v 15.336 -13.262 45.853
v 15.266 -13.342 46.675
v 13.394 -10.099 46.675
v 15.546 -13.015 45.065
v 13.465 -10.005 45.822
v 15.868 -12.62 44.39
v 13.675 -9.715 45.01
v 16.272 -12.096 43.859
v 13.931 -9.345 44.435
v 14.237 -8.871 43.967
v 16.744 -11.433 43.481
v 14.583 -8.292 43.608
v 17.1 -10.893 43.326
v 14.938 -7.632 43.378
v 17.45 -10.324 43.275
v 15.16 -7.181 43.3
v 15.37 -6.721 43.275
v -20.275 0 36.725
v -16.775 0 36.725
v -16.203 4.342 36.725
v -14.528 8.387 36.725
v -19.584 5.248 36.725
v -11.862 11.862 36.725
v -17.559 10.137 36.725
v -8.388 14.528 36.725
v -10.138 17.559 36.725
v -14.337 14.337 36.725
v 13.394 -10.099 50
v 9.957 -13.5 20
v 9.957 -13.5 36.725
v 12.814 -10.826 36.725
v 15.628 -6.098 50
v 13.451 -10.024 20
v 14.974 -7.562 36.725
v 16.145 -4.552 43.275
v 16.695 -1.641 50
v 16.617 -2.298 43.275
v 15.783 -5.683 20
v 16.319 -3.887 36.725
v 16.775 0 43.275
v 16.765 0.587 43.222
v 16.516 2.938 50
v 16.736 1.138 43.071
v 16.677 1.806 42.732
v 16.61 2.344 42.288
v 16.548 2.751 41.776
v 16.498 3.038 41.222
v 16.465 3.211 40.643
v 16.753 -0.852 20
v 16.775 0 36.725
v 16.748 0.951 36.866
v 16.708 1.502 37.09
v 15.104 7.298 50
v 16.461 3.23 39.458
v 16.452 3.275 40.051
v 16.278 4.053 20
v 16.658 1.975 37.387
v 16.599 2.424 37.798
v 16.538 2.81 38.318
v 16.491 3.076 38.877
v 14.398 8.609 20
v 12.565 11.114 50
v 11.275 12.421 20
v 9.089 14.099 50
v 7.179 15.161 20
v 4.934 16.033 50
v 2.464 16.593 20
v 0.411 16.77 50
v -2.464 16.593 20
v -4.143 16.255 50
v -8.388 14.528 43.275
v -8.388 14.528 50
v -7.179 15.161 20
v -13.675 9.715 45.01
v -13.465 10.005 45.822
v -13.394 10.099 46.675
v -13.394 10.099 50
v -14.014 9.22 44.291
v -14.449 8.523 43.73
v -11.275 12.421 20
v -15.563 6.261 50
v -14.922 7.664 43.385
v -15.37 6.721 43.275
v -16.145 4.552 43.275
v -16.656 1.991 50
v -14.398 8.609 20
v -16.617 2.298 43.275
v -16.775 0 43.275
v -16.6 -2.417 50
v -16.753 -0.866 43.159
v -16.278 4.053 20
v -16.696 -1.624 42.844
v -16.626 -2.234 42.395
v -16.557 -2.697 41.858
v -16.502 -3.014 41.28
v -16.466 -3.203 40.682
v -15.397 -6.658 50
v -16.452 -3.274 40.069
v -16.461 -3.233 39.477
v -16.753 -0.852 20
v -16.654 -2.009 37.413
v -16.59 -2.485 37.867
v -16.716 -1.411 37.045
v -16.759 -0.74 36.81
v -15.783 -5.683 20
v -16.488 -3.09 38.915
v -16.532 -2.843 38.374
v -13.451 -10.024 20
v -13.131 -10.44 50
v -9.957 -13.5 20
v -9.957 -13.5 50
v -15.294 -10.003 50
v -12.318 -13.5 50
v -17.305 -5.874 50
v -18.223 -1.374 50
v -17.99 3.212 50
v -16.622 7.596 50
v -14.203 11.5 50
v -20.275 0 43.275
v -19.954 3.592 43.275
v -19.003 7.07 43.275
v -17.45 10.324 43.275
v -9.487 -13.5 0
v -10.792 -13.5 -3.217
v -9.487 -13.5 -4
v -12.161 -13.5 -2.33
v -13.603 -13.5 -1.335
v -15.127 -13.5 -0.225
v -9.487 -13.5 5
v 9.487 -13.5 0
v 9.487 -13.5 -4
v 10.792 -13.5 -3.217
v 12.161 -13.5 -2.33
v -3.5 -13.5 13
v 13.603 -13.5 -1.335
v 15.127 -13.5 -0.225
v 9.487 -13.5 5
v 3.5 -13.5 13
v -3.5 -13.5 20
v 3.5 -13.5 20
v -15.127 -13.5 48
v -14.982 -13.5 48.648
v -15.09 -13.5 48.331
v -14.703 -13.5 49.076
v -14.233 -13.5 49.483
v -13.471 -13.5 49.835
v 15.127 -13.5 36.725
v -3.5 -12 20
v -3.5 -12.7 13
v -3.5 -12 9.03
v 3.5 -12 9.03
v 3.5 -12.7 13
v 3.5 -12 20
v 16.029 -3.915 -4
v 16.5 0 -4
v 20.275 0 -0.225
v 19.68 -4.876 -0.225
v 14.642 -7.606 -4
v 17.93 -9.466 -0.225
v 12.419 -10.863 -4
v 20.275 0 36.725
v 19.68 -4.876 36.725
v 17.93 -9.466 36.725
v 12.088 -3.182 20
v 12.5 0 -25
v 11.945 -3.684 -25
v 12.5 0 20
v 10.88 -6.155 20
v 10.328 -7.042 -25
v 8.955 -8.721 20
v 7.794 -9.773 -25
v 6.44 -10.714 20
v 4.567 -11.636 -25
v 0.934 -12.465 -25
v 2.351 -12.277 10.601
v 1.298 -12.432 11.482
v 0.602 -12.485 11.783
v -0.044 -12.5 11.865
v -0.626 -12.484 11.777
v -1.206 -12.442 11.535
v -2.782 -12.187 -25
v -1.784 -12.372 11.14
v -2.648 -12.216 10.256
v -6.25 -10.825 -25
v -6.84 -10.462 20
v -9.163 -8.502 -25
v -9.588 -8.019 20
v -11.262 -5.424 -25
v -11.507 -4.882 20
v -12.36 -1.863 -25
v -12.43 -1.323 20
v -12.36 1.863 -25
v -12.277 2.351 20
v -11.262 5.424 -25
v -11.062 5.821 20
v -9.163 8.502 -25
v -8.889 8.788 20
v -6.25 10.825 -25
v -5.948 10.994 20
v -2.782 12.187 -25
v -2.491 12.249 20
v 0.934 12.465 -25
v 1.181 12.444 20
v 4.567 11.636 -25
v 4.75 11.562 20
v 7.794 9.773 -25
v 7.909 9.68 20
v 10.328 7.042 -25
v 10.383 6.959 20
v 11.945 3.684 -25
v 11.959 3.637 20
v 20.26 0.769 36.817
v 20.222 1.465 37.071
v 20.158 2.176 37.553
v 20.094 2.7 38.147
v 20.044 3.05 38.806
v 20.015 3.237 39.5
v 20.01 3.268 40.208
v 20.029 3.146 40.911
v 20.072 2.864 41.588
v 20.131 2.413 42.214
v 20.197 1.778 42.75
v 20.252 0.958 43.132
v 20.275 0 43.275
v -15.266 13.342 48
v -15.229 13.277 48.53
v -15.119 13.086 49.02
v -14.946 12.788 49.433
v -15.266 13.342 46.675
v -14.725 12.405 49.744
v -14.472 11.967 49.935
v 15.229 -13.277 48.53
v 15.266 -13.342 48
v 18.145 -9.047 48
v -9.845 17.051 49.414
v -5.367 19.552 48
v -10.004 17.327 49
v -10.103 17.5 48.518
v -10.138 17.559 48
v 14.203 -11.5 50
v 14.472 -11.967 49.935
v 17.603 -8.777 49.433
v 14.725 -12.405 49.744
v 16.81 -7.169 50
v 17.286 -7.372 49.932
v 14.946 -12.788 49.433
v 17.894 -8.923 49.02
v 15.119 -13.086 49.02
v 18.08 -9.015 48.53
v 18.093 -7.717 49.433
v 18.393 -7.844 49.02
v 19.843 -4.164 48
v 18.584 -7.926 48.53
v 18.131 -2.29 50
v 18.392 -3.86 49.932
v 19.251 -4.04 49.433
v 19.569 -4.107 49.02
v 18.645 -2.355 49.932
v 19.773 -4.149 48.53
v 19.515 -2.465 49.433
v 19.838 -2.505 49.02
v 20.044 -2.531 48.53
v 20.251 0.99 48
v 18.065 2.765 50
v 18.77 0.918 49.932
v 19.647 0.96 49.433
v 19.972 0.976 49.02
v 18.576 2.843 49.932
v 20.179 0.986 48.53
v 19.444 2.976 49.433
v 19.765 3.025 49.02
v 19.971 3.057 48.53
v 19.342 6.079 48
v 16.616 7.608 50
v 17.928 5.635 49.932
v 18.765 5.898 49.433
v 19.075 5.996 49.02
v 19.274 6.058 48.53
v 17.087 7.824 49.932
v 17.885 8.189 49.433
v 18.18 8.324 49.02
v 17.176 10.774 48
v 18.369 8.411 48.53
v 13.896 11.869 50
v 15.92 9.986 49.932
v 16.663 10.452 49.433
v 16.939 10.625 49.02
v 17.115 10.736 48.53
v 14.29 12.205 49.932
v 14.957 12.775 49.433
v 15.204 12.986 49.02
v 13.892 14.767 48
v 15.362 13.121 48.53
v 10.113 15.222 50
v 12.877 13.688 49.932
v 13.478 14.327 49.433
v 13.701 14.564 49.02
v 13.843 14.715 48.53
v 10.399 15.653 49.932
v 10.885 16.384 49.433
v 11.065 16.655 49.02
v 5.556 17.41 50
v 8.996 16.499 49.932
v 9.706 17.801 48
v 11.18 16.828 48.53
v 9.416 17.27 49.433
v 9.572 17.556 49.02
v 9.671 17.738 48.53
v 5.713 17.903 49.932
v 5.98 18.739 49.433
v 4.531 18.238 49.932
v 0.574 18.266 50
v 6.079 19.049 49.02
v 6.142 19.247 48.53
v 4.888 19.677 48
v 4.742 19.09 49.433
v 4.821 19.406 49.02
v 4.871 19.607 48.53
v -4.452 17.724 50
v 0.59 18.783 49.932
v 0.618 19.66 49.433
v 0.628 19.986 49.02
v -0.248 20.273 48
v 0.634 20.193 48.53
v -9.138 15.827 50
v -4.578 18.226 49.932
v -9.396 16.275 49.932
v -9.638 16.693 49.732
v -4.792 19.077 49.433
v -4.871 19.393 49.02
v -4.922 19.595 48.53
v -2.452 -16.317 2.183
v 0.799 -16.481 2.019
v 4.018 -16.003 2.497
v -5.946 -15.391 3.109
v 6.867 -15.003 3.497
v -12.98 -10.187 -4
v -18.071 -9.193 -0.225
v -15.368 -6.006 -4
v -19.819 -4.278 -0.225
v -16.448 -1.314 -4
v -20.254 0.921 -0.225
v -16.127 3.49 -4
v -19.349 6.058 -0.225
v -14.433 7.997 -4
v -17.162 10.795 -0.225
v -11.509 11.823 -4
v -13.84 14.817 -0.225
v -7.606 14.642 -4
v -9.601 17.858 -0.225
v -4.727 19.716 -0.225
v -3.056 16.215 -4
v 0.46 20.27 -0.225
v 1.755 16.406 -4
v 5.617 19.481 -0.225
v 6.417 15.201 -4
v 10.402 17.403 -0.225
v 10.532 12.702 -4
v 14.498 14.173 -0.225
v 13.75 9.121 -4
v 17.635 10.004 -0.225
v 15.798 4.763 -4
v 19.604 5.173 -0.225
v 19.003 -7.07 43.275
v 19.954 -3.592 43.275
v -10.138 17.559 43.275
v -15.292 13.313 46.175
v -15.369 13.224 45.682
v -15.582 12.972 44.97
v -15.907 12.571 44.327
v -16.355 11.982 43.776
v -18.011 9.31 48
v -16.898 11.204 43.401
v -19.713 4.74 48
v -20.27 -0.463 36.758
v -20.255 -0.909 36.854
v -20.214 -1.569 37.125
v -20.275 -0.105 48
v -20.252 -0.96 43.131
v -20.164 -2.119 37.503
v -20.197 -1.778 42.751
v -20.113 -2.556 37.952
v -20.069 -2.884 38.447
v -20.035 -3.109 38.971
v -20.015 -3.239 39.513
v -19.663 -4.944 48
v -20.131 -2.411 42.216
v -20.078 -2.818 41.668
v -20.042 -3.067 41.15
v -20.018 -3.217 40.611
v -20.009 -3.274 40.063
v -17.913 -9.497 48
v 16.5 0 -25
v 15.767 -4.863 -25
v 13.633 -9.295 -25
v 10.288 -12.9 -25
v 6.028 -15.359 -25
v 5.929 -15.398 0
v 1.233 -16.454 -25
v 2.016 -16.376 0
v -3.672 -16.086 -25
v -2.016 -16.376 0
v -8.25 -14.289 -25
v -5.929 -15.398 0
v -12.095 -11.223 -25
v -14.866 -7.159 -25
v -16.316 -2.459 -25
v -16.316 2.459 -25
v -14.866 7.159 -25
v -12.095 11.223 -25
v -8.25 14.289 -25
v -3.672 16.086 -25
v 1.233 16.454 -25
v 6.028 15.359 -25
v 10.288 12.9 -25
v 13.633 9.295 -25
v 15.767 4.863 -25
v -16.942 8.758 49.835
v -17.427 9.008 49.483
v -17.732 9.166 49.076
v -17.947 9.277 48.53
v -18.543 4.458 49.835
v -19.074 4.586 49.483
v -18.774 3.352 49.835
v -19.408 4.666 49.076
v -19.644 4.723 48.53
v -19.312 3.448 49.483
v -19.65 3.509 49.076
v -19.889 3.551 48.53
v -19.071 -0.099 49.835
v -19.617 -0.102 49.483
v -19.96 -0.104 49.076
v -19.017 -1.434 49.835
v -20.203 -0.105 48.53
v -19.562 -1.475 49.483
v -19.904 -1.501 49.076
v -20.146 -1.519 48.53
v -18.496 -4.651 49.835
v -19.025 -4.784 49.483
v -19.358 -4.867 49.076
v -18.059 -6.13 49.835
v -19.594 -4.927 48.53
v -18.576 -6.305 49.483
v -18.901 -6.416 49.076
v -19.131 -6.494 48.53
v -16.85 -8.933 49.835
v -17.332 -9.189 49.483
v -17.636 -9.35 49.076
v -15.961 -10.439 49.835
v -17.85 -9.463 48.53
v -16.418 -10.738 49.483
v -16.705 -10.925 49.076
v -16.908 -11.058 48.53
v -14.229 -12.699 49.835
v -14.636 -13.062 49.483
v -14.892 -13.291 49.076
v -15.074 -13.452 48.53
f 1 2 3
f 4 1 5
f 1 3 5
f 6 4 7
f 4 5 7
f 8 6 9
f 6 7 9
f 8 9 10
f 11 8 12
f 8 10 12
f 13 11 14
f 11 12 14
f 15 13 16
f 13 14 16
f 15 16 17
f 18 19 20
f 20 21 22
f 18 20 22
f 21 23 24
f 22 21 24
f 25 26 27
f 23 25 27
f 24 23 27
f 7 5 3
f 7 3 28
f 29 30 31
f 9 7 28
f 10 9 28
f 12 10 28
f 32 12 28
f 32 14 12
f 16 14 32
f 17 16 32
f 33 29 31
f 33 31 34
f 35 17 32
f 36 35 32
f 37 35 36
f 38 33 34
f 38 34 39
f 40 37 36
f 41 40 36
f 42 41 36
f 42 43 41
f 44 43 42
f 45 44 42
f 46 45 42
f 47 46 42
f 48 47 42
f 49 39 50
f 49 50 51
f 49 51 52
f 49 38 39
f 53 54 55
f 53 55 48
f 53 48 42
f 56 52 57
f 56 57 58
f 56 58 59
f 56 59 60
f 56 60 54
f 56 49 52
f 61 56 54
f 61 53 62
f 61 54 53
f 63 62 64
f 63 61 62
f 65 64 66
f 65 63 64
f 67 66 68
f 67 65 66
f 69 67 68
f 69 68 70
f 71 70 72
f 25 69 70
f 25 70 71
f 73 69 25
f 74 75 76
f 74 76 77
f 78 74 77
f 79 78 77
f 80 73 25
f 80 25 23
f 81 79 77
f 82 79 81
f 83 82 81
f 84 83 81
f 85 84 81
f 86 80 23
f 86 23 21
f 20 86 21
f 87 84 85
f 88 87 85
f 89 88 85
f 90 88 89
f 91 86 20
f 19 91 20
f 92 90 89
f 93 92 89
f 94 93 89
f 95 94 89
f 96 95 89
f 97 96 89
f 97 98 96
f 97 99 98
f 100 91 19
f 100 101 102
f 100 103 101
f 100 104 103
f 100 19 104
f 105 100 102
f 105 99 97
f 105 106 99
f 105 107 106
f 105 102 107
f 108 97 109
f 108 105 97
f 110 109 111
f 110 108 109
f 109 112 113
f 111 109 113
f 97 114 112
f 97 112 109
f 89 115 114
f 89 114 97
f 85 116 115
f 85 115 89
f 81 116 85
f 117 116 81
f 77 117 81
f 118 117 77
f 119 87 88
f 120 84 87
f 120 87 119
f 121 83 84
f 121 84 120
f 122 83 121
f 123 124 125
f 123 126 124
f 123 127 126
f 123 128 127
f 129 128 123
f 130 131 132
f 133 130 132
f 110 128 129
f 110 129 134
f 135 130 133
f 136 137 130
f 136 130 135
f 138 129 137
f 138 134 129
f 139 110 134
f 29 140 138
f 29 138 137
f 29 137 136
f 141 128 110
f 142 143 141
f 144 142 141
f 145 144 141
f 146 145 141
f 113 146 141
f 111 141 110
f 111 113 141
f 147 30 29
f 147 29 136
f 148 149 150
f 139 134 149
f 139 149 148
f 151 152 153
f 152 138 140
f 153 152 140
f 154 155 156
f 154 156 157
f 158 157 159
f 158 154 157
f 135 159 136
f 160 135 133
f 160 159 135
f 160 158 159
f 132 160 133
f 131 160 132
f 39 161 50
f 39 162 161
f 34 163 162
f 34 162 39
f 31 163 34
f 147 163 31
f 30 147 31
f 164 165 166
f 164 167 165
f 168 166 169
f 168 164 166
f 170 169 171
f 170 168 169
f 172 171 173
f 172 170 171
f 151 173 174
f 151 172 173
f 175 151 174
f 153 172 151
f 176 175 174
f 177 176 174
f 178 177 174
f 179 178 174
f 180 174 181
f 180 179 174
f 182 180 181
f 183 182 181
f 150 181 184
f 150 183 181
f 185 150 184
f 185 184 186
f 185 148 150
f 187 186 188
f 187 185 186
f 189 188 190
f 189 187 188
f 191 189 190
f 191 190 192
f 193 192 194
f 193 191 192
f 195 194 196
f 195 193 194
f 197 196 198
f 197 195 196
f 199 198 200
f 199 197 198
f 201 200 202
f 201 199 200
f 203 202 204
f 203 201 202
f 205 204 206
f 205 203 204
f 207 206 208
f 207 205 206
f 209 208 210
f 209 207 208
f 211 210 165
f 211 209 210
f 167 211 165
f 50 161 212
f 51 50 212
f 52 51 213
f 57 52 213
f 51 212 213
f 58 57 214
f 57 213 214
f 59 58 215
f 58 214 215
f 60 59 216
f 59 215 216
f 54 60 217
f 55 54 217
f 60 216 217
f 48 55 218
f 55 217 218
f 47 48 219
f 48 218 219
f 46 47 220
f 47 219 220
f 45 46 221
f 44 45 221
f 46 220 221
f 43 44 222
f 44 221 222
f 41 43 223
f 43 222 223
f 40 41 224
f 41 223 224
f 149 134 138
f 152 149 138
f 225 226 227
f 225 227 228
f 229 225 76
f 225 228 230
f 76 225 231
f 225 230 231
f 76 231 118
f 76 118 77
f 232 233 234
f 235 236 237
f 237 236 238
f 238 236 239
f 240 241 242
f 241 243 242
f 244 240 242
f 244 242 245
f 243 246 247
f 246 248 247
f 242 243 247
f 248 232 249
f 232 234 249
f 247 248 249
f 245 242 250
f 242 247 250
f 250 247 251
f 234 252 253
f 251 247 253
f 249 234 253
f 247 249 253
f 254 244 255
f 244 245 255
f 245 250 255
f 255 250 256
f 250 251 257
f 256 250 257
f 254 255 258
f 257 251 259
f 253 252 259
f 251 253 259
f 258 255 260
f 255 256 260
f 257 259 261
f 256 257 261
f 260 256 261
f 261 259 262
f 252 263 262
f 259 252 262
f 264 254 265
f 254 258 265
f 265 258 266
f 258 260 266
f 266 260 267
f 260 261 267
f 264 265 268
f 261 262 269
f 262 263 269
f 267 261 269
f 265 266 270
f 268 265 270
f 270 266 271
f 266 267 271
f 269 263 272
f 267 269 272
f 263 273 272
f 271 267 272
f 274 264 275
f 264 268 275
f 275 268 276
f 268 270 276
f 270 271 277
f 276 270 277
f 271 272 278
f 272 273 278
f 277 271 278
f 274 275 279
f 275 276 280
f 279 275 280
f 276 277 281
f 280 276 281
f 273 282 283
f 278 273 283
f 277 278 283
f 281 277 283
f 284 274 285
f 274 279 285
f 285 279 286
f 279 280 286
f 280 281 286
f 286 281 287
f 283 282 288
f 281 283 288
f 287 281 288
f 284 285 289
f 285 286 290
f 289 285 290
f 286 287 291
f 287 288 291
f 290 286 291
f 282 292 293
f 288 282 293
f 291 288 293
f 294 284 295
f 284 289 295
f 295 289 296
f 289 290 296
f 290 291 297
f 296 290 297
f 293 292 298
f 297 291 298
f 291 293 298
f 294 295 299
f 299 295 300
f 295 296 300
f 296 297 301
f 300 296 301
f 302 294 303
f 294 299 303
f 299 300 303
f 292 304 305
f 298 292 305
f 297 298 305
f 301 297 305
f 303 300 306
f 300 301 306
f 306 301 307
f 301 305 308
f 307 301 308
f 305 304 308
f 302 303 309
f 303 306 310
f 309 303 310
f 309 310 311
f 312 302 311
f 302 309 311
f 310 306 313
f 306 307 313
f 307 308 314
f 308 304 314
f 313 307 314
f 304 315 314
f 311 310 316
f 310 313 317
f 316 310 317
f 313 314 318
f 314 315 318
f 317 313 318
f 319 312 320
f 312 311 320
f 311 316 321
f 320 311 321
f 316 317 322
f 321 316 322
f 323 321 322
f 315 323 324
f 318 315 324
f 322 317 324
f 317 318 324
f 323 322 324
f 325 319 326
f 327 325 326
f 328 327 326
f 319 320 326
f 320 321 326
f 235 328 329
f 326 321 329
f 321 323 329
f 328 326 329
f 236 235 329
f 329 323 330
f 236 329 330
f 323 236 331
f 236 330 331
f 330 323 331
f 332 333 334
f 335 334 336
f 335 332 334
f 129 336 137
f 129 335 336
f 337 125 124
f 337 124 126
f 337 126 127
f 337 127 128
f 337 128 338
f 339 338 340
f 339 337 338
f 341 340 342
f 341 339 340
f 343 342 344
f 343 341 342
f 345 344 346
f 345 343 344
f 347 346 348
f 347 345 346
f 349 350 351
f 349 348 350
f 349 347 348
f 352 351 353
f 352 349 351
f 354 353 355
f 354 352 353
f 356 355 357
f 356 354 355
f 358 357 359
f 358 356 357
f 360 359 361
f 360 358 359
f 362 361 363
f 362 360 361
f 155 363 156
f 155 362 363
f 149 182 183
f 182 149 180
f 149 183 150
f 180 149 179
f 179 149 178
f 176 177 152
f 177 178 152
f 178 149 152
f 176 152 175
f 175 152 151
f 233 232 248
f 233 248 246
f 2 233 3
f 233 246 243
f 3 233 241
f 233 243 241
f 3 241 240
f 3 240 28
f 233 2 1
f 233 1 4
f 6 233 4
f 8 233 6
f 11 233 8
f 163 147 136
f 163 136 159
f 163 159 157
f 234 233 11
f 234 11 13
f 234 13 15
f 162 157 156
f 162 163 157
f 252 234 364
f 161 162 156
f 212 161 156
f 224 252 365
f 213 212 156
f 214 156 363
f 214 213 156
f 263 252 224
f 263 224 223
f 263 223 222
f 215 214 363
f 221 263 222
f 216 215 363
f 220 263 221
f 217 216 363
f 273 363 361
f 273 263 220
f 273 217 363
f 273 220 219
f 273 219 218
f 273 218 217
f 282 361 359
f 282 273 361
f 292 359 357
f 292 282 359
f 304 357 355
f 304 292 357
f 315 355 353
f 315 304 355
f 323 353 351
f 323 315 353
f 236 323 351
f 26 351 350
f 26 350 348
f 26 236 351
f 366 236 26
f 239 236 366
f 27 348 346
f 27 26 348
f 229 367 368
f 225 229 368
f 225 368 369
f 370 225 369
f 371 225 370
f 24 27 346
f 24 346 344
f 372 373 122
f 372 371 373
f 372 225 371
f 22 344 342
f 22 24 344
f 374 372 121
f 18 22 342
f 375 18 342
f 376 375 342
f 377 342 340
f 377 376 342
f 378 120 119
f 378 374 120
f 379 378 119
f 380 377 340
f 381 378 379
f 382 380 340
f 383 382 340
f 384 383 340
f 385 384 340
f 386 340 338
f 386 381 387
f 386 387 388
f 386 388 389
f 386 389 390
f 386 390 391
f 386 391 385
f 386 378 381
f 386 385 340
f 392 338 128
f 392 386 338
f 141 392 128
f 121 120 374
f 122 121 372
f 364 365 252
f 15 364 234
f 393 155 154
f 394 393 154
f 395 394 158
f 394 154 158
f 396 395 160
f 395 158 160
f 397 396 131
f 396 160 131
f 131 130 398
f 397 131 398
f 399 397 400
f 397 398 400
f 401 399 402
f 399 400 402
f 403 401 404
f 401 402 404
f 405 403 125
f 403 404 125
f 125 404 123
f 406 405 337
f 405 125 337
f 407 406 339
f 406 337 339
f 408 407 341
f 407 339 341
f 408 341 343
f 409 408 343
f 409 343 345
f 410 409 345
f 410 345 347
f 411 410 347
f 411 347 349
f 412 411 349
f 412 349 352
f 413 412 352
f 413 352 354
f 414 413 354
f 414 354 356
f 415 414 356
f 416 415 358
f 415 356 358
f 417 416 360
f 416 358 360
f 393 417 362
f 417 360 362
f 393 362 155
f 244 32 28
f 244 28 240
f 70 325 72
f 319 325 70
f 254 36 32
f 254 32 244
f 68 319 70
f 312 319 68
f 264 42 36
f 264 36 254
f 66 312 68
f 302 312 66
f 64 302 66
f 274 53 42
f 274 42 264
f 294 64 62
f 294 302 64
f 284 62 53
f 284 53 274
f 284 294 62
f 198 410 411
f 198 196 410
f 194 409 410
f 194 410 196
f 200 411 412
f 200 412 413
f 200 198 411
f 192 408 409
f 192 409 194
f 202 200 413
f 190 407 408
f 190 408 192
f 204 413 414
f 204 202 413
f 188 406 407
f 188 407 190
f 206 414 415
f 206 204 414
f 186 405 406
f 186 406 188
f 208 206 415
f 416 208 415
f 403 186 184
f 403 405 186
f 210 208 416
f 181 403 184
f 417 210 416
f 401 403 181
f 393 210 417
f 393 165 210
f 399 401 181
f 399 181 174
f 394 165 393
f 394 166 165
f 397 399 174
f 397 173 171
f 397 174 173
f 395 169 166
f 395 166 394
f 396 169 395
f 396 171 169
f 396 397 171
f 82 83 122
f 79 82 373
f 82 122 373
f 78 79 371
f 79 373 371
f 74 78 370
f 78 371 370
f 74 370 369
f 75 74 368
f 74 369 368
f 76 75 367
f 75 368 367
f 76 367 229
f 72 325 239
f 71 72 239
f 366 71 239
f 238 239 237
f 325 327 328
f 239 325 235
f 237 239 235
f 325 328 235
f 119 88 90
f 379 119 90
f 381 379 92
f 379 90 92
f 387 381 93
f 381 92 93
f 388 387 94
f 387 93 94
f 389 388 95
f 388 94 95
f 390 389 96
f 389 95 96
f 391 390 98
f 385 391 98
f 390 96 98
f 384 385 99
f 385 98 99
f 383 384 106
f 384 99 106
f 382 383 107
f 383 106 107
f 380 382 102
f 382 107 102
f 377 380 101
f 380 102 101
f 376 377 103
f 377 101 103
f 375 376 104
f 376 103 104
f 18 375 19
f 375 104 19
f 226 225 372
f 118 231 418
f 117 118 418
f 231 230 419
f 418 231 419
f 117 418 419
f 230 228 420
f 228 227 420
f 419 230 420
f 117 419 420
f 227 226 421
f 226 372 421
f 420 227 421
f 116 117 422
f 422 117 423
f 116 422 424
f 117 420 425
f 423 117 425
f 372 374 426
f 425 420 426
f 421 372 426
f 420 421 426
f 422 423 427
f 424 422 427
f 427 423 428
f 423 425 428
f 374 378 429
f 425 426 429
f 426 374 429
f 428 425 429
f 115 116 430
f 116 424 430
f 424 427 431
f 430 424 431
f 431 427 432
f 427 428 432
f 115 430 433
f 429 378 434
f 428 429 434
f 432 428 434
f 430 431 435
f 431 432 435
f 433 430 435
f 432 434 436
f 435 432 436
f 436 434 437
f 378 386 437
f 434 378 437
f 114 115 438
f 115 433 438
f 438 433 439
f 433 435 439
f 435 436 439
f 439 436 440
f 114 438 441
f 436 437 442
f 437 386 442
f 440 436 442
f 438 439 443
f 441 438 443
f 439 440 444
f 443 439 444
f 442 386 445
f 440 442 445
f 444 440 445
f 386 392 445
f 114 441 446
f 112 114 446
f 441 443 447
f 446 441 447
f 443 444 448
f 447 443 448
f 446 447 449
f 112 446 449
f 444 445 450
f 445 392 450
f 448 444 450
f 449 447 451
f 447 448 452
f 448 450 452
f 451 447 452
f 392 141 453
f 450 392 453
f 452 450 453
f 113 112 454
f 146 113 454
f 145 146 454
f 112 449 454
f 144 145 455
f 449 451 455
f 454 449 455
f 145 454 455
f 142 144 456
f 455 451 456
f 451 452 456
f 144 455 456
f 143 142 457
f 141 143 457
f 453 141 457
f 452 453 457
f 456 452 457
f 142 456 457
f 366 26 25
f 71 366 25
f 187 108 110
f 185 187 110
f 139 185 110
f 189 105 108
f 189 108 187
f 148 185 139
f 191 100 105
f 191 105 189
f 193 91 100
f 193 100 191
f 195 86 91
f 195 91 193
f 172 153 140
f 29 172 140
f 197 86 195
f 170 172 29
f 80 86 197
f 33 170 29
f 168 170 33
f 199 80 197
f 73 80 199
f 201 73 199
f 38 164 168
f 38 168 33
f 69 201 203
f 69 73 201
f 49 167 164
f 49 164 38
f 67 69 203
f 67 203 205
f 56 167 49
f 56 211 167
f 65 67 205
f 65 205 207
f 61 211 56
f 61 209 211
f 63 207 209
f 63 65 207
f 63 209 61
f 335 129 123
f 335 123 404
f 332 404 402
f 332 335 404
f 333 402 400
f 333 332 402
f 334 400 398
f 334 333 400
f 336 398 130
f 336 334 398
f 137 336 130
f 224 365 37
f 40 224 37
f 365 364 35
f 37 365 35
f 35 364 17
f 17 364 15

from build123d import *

# Parameters (mm, degrees)
F2_R          = 3.275
F3_DEPTH      = 25
F4_W          = 4
F4_H          = 6.55
F5_ANGLE      = 60
F6_W          = 4
F6_H          = 6.55
F7_ANGLE      = 60
F9_DEPTH      = 10
F10_W         = 32
F10_H         = 8
F11_DEPTH     = 50.0010001
F12_W         = 7
F12_H         = 7
F13_DEPTH     = 5
F15_DEPTH     = 3.5
F16_R         = 2
F17_R         = 3.4
F18_R         = 16.5
F18_R_2       = 12.5
F19_DEPTH     = 25
F20_T4_ANGLE  = 270.7214927844
F20_S5_R      = 20.275
F20_T6_DEPTH  = 31
F20_T11_ANGLE = 90.6289211612
F20_S12_R     = 20.275
F20_T13_DEPTH = 16
F21_T4_DEPTH  = 44.6904958407
F21_S5_R      = 16.5
F21_T6_DEPTH  = 24


# Not quite as in the source:
# - a fillet or chamfer that OpenCascade refuses, or shapes differently, is made with other operations: its cross-section is extruded or revolved along the edge and cut away or added


with BuildPart() as f1:
    # F0 (on Front) → F1 (revolve)
    with BuildSketch(Plane.XZ):
        Polygon((20.275, 50), (16.775, 50), (16.775, 20), (12.5, 20), (12.5, 0), (20.275, 0), align=None)
    revolve(axis=Axis((0, 0, 24.5366517103), (0, 0, 1)))

    # F2 (on Right) → F3 (cut, symmetric)
    with BuildSketch(Plane.YZ):
        with Locations((0, 40)):
            Circle(F2_R)
    extrude(amount=F3_DEPTH, both=True, mode=Mode.SUBTRACT)

    # F4 (on Front) → F5 (revolve, cut)
    with BuildSketch(Plane.XZ):
        with Locations((18.275, 40)):
            Rectangle(F4_W, F4_H)
    revolve(axis=Axis((0, 0, 25.1644738019), (0, 0, -1)), revolution_arc=F5_ANGLE, mode=Mode.SUBTRACT)

    # F6 (on Front) → F7 (revolve, cut)
    with BuildSketch(Plane.XZ):
        with Locations((-18.275, 40)):
            Rectangle(F6_W, F6_H)
    revolve(axis=Axis((0, 0, 23.5361852683), (0, 0, -1)), revolution_arc=F7_ANGLE, mode=Mode.SUBTRACT)

    # F8 (on face) → F9 (cut)
    with BuildSketch(Plane.XY.offset(50)):
        with BuildLine():
            Line((-8.3875, 14.5275761485), (-10.1375, 17.5586650617))
            ThreePointArc((-10.1375, 17.5586650617), (-12.8757169507, 15.6617859137), (-15.2663853672, 13.342155104))
            Line((-15.2663853672, 13.342155104), (-13.3941586478, 10.0993633026))
            ThreePointArc((-13.3941586478, 10.0993633026), (-11.1136146512, 12.5653569144), (-8.3875, 14.5275761485))
        make_face()
        with BuildLine():
            Line((8.3875, -14.5275761485), (10.1375, -17.5586650617))
            ThreePointArc((10.1375, -17.5586650617), (12.8757169507, -15.6617859137), (15.2663853672, -13.342155104))
            Line((15.2663853672, -13.342155104), (13.3941586478, -10.0993633026))
            ThreePointArc((13.3941586478, -10.0993633026), (11.1136146512, -12.5653569144), (8.3875, -14.5275761485))
        make_face()
    extrude(amount=-F9_DEPTH, mode=Mode.SUBTRACT)

    # F10 (on face) → F11 (cut, through all)
    with BuildSketch(Plane.XY.offset(50)):
        with Locations((0, -17.5)):
            Rectangle(F10_W, F10_H)
    extrude(amount=-F11_DEPTH, mode=Mode.SUBTRACT)

    # F12 (on face) → F13 (cut)
    with BuildSketch(Plane.XZ.offset(13.5)):
        with Locations((0, 16.5)):
            Rectangle(F12_W, F12_H)
    extrude(amount=-F13_DEPTH, mode=Mode.SUBTRACT)

    # F14 (on Right) → F15 (cut, symmetric)
    with BuildSketch(Plane.YZ):
        Polygon((-10.3, 13), (-12.7, 13), (-11.2893841543, 5), (-10.3, 5), align=None)
    extrude(amount=F15_DEPTH, both=True, mode=Mode.SUBTRACT)

    # F16
    f16_edges = [f1.edges().sort_by_distance(p)[0] for p in [
        (15.661786, 12.875717, 50),
        (-20.274727, -0.105295, 50),
    ]]
    fillet(f16_edges, radius=F16_R)

    # F17
    f17_edges = [f1.edges().sort_by_distance(p)[0] for p in [
        (-14.330272, 11.720759, 43.275),
        (14.330272, -11.720759, 43.275),
    ]]
    fillet(f17_edges, radius=F17_R)

    # F18 (on face) → F19 (join)
    with BuildSketch(Plane(origin=(0, 0, 0), x_dir=(1, 0, 0), z_dir=(0, 0, -1))):
        Circle(F18_R)
        Circle(F18_R_2, mode=Mode.SUBTRACT)
    extrude(amount=F19_DEPTH)

    # F20: chamfer of 4 on 2 edges, made by hand


with BuildPart() as f20_tool2:
    # F20_s3 → F20_t4 (revolve)
    with BuildSketch(Plane(origin=(0, 0, 0), x_dir=(0, 0, 1), z_dir=(0.9999207165, 0.0125920918, 0))):
        Polygon((0, 20.5), (-4, 16.5), (0, 16.5), align=None)
    revolve(axis=Axis((0, 0, 0), (0, 0, -1)), revolution_arc=F20_T4_ANGLE)

    # F20_s5 → F20_t6 (intersect, symmetric)
    with BuildSketch(Plane.XY.offset(-2)):
        Circle(F20_S5_R)
    extrude(amount=F20_T6_DEPTH, both=True, mode=Mode.INTERSECT)

    split(bisect_by=Plane.XZ.offset(13.5), keep=Keep.BOTTOM)


with BuildPart() as f1_1:
    add(f1.part)

    # F20_t1: union F20_tool2
    add(f20_tool2.part)


with BuildPart() as f20_tool9:
    # F20_s10 → F20_t11 (revolve)
    with BuildSketch(Plane.XZ):
        Polygon((20.5, 0), (16.5, -4), (16.5, 0), align=None)
    revolve(axis=Axis((0, 0, 0), (0, 0, -1)), revolution_arc=F20_T11_ANGLE)

    # F20_s12 → F20_t13 (intersect, symmetric)
    with BuildSketch(Plane.XY.offset(-2)):
        Circle(F20_S12_R)
    extrude(amount=F20_T13_DEPTH, both=True, mode=Mode.INTERSECT)

    split(bisect_by=Plane.XZ.offset(13.5), keep=Keep.BOTTOM)


with BuildPart() as f1_2:
    add(f1_1.part)

    # F20_t8: union F20_tool9
    add(f20_tool9.part)

    # F21: chamfer of 5 on 1 edges, made by hand


with BuildPart() as f21_tool2:
    # F21_s3 → F21_t4 (new body)
    with BuildSketch(Plane.YZ.offset(-22.3452479203)):
        Polygon((-18.5, 0), (-13.5, 5), (-13.5, 0), align=None)
    extrude(amount=F21_T4_DEPTH)

    # F21_s5 → F21_t6 (intersect, symmetric)
    with BuildSketch(Plane.XY.offset(2.5)):
        Circle(F21_S5_R)
    extrude(amount=F21_T6_DEPTH, both=True, mode=Mode.INTERSECT)


with BuildPart() as f1_3:
    add(f1_2.part)

    # F21_t1: union F21_tool2
    add(f21_tool2.part)


solid = f1_3.part
